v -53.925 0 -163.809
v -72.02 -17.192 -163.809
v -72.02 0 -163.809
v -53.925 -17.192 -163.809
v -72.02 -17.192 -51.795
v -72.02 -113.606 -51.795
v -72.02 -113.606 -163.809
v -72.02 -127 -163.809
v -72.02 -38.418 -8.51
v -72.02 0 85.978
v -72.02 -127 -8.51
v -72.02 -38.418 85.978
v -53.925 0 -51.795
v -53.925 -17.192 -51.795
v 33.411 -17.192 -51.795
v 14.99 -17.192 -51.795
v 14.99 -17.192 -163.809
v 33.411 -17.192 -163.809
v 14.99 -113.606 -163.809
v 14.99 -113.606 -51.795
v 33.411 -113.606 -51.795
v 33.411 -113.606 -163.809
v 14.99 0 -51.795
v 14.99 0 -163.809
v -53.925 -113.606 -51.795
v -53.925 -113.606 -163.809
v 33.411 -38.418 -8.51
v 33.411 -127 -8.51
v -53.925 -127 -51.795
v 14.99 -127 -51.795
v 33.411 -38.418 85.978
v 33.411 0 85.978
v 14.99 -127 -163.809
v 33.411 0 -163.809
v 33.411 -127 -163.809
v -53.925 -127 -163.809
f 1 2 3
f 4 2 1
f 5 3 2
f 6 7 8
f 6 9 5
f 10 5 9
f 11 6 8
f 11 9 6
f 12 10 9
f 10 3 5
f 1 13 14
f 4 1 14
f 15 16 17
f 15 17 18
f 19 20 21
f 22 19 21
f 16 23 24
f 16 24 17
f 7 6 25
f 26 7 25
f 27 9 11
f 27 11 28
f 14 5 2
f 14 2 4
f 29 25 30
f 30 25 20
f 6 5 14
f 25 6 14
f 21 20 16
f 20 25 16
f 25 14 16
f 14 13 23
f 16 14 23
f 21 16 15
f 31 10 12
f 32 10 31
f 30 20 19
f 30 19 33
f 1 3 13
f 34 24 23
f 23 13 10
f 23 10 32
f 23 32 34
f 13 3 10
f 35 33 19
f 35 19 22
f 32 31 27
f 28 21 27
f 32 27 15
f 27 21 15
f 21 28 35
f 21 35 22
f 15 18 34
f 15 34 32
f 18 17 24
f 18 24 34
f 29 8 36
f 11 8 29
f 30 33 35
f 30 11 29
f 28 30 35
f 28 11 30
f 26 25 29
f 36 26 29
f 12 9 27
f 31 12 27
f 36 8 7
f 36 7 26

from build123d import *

# Parameters (mm, degrees)
F0_W     = 105.4313331842
F0_H     = 68.6848964542
F1_DEPTH = 127
F2_DEPTH = 25.4
F3_W     = 105.4313331842
F3_H     = 38.4183302522
F4_DEPTH = 94.488
F5_W     = 18.094740808
F5_H     = 17.1922501177
F5_W_2   = 18.4211255983
F5_H_2   = 13.3941207528
F6_DEPTH = 112.014


with BuildPart() as f1:
    # F0 (on Front) → F1 (new body)
    with BuildSketch(Plane.XZ):
        with Locations((-19.3043276668, -17.4522669986)):
            Rectangle(F0_W, F0_H)
    extrude(amount=F1_DEPTH)

    # F2 (cut): a face of the model
    f2_faces = [f1.faces().sort_by_distance(p)[0] for p in [
        (-19.3043276668, -63.5, 16.8901812285),
    ]]
    extrude(f2_faces, amount=-F2_DEPTH, mode=Mode.SUBTRACT)

    # F3 (on face) → F4 (join)
    with BuildSketch(Plane.XY.offset(-8.5098187715)):
        with Locations((-19.3043276668, -19.2091651261)):
            Rectangle(F3_W, F3_H)
    extrude(amount=F4_DEPTH)

    # F5 (on face) → F6 (join)
    with BuildSketch(Plane(origin=(0, 0, -51.7947152257), x_dir=(1, 0, 0), z_dir=(0, 0, -1))):
        with Locations((-62.9726238549, 8.5961250588)):
            Rectangle(F5_W, F5_H)
        with Locations((24.2007761262, 8.5961250588)):
            Rectangle(F5_W_2, F5_H)
        with Locations((24.2007761262, 120.3029396236)):
            Rectangle(F5_W_2, F5_H_2)
        with Locations((-62.9726238549, 120.3029396236)):
            Rectangle(F5_W, F5_H_2)
    extrude(amount=F6_DEPTH)


solid = f1.part
